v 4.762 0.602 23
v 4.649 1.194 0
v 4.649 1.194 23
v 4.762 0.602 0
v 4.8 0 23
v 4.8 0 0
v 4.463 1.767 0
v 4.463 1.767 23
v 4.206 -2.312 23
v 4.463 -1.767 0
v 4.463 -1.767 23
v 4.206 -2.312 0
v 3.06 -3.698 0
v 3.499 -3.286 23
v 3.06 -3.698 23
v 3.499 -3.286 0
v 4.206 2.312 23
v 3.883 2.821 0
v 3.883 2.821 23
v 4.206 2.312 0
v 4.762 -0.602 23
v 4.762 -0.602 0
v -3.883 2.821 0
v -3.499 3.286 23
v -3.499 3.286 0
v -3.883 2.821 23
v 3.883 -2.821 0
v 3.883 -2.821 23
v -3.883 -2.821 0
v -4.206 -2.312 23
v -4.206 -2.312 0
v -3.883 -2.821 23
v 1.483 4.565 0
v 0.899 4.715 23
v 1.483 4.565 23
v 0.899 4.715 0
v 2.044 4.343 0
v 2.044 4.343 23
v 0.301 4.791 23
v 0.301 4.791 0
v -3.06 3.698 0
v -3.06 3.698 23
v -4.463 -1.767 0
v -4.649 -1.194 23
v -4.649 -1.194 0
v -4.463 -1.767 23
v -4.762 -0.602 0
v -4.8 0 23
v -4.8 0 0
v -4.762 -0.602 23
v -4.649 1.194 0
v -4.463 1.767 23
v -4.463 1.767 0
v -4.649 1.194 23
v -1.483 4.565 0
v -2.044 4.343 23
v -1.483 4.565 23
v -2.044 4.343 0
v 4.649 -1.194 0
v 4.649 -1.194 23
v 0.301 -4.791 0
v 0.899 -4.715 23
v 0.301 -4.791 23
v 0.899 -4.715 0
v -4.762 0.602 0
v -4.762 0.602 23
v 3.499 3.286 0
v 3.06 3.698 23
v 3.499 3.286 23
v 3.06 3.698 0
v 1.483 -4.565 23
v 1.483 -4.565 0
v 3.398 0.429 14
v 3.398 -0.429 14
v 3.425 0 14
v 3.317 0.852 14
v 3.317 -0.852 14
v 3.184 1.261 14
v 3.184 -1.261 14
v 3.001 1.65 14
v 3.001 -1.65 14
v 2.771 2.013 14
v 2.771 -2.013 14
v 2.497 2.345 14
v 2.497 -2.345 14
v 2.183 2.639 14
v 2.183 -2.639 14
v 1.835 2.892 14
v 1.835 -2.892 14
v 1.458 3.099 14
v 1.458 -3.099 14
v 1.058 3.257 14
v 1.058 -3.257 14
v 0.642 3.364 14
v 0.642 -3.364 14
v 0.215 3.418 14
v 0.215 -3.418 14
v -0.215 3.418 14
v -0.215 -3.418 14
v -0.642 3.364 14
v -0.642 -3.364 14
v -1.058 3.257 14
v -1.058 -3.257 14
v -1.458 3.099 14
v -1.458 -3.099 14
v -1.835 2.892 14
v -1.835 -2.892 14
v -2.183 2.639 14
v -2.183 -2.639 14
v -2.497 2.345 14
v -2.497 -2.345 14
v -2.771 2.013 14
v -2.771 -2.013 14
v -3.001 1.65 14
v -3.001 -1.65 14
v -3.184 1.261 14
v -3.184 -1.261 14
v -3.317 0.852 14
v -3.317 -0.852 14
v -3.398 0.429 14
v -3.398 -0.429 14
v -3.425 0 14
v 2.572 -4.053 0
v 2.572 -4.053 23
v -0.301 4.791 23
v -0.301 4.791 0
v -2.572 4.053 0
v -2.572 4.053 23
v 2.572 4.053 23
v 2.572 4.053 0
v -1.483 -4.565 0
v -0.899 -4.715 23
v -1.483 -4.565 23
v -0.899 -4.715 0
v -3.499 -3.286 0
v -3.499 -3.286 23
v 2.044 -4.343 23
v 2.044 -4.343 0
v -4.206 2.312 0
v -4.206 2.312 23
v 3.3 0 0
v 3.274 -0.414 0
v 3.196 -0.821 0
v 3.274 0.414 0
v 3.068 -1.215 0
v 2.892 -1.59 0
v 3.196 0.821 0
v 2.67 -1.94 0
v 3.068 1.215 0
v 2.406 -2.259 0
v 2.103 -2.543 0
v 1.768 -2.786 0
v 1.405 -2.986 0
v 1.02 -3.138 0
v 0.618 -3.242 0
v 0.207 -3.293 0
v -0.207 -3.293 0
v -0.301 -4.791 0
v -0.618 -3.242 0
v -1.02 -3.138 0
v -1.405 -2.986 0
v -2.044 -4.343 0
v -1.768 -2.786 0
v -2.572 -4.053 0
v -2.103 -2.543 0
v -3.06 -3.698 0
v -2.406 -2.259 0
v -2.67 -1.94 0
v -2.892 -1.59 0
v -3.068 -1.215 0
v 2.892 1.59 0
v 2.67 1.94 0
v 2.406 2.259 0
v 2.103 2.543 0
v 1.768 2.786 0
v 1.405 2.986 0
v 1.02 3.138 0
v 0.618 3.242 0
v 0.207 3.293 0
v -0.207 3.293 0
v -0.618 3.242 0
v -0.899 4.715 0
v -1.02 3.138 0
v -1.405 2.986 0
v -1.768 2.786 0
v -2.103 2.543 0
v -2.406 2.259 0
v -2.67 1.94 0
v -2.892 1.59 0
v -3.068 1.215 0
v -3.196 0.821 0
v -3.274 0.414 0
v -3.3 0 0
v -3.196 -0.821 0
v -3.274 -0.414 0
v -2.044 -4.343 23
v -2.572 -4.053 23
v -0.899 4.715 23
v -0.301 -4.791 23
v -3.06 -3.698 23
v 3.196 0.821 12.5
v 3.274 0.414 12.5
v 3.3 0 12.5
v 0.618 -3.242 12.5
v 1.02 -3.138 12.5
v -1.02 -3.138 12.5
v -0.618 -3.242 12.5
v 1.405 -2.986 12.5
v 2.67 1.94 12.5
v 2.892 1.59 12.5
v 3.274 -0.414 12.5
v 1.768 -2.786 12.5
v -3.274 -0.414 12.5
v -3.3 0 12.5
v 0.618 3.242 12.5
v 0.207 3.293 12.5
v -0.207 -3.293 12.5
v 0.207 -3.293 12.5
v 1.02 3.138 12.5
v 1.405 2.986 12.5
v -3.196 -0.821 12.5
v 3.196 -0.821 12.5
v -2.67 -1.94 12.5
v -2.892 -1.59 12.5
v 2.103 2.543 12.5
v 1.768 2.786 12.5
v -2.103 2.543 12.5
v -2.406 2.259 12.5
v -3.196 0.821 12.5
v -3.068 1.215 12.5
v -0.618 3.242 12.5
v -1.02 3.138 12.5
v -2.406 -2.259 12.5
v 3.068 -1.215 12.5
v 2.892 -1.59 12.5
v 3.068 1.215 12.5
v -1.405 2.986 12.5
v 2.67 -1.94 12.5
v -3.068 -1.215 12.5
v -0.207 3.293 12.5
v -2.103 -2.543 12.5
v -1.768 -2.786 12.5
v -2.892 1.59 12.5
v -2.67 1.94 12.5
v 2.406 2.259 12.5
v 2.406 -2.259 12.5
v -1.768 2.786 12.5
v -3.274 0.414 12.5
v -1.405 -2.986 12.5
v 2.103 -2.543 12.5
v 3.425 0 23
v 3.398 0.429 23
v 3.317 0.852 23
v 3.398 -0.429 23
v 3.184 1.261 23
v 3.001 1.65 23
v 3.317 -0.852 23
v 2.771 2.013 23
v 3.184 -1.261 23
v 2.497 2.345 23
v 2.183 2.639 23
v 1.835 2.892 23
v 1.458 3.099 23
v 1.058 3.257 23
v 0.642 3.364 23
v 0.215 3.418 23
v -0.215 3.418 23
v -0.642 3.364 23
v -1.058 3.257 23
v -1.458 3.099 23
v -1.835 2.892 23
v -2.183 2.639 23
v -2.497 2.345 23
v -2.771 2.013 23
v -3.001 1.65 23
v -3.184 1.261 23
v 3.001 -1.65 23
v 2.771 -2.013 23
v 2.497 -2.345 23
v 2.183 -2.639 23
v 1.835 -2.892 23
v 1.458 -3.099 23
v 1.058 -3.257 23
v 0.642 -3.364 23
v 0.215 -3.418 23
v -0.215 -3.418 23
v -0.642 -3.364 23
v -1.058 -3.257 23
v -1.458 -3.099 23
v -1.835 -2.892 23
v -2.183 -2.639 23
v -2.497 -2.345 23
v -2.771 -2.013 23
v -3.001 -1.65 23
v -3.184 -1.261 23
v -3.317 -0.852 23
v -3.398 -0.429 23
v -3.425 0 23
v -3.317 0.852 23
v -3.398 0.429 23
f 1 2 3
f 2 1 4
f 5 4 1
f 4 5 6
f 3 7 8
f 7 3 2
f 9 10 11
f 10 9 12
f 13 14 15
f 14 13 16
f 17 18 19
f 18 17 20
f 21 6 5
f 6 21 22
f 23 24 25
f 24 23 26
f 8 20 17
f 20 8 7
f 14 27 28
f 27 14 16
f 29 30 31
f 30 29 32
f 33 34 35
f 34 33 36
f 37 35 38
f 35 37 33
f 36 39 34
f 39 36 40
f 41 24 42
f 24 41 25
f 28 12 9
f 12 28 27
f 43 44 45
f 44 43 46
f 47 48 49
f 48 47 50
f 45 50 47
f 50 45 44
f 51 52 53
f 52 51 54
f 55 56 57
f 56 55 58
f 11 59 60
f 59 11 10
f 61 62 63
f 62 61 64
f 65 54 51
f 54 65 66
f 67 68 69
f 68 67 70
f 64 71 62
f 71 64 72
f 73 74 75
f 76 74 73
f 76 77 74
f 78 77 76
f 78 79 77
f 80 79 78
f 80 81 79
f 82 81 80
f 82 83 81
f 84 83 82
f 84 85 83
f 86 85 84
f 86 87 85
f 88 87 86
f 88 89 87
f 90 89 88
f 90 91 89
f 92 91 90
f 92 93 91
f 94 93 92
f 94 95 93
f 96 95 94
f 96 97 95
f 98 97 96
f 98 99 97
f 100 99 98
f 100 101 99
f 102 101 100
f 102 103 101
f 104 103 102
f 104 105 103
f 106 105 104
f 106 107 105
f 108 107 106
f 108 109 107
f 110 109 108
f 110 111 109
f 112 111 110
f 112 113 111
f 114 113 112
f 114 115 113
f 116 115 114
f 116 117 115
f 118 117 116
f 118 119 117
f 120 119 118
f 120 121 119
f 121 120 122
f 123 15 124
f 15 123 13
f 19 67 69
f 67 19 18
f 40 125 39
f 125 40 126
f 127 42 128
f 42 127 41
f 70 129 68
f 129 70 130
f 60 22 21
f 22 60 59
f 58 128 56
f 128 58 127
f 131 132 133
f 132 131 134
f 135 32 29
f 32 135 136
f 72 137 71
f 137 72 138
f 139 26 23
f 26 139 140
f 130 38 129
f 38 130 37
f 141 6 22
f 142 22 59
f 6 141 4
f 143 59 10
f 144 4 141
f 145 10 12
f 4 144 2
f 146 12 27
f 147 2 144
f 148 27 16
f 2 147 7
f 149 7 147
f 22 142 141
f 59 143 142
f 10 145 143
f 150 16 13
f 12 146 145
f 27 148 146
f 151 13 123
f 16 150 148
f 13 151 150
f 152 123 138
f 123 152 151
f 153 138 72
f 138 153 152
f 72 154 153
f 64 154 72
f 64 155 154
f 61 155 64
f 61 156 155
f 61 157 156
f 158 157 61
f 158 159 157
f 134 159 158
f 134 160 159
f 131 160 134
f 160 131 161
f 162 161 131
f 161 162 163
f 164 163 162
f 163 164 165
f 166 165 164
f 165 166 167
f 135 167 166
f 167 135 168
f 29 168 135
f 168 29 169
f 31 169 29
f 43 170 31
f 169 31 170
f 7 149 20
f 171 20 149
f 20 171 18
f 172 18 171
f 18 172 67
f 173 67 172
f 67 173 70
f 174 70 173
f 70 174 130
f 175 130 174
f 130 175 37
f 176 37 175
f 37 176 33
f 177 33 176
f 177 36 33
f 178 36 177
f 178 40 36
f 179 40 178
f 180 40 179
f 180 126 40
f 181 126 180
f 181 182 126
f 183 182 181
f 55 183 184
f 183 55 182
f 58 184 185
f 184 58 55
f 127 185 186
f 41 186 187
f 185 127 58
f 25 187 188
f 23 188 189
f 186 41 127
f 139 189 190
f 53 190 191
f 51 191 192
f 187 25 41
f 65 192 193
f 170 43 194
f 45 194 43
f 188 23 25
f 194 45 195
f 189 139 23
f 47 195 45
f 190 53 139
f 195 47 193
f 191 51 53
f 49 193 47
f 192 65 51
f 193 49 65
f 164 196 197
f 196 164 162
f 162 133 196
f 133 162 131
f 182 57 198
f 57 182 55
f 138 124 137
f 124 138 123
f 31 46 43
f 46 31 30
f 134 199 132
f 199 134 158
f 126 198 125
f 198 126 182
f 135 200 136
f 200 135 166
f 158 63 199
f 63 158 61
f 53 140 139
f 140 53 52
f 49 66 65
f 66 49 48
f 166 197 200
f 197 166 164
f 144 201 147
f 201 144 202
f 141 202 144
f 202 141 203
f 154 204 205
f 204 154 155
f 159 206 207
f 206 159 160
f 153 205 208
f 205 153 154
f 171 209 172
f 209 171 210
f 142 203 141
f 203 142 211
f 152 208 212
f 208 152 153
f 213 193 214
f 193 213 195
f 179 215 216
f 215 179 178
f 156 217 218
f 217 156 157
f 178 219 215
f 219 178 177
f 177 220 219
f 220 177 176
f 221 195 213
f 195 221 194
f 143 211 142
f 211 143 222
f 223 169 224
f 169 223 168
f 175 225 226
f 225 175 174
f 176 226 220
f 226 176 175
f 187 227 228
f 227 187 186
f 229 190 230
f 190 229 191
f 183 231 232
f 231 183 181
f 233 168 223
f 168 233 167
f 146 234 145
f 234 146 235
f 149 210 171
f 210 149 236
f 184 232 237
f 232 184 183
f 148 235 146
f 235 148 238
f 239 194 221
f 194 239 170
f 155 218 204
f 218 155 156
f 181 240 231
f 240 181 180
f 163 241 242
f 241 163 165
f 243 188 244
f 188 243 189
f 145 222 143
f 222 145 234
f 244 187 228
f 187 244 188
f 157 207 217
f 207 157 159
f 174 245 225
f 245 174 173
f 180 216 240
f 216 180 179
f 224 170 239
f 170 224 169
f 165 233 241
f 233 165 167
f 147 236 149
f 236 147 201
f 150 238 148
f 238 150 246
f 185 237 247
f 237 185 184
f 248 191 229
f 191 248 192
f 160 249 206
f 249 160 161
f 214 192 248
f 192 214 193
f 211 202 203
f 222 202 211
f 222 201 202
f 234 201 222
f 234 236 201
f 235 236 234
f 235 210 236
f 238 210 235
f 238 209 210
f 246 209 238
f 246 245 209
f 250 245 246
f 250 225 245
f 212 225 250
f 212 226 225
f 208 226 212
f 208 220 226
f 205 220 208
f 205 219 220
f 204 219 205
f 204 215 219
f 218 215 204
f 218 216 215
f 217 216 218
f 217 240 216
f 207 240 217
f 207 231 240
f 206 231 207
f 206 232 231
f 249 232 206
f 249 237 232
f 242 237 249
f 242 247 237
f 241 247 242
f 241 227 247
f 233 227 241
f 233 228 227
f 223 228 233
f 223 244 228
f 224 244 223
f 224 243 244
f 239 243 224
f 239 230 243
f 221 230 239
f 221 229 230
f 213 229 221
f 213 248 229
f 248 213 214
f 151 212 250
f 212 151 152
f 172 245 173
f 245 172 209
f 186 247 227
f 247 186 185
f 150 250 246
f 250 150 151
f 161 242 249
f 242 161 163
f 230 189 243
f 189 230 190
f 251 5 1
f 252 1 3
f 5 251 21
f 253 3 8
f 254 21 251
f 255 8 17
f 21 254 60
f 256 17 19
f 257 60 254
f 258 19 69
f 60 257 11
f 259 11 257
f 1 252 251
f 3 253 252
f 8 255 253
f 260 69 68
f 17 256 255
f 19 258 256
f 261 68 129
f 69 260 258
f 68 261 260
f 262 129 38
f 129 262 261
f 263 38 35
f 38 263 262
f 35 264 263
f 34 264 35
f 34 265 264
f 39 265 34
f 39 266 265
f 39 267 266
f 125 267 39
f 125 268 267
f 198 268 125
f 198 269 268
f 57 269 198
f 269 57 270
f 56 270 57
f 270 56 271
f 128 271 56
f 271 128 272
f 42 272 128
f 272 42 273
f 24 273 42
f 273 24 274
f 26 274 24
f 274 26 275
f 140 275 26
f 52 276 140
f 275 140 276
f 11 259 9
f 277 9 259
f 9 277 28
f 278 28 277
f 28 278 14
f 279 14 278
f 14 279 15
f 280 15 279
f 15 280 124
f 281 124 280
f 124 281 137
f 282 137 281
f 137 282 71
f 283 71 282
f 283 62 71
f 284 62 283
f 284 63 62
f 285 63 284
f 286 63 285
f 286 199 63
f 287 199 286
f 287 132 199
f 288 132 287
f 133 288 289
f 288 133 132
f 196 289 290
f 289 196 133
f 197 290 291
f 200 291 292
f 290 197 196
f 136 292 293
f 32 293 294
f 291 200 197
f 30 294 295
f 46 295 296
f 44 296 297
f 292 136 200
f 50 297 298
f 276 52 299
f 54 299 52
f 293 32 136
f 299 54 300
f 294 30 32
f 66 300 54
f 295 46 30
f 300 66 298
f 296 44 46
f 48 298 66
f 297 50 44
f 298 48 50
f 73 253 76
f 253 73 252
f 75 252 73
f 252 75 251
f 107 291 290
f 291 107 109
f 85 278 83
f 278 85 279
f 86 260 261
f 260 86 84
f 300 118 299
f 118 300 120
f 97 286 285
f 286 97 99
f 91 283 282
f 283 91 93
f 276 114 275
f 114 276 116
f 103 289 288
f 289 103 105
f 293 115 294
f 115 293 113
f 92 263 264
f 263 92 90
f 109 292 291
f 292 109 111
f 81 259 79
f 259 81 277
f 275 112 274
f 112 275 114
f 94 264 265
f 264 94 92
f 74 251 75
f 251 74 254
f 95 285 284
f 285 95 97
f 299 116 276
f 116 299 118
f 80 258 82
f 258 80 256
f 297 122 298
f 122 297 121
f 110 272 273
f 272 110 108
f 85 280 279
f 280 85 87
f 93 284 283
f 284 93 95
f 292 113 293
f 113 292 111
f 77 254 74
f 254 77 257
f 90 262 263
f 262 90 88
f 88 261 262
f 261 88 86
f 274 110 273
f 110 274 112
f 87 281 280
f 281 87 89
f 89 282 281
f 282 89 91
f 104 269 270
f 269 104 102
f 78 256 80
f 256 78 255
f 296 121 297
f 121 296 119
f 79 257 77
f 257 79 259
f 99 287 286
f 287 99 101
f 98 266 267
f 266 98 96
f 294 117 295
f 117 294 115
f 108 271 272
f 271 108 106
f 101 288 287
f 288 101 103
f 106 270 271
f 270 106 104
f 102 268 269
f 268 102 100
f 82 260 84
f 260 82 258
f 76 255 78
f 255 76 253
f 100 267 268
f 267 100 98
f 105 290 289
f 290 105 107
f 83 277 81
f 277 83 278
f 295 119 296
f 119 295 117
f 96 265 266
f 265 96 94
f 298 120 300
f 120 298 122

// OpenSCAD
/* 
   Parametric ROD CONNECTOR - Ball joint to carbon fiber rod
   v1.0
*/

/*********************************************************************/
/*********************************************************************
Copyright (C) 2016  Alejandro Véliz Fernández

This program is free software: you can redistribute it and/or modify
it under the terms of the GNU General Public License as published by
the Free Software Foundation, either version 3 of the License, or
(at your option) any later version.

This program is distributed in the hope that it will be useful,
but WITHOUT ANY WARRANTY; without even the implied warranty of
MERCHANTABILITY or FITNESS FOR A PARTICULAR PURPOSE.  See the
GNU General Public License for more details.

You should have received a copy of the GNU General Public License
along with this program.  If not, see <http://www.gnu.org/licenses/>.
*********************************************************************/
/********************************************************************/

/* Configuration params */
// Rod diameter
Rodiam = 6.2;
// Rod length (rod length that goes into the part)
Rodlen = 12.5;
// End Rod diameter
EndRodiam = 6.45;
// End Rod length (end rod length that goes into the part)
EndRodlen = 9;
// Print tolerance
tolerance = 0.4;
// Wall thickness
walls = 3;
// Solid separator length
solidlen = 1.5;
/* [Hidden] */
$fn=50;


/* Connector code */
union(){
    // Rod part
    difference(){
        cylinder(r=(Rodiam+tolerance+walls)/2, h=Rodlen+solidlen);
        translate([0,0,-2])cylinder(r=(Rodiam+tolerance)/2, h=Rodlen+2);
    }
    // End Rod
    translate([0,0,Rodlen+solidlen]){
        difference(){
            cylinder(r=(Rodiam+tolerance+walls)/2, h=EndRodlen);
            cylinder(r=(EndRodiam+tolerance)/2, h=EndRodlen+2);
        }
    }
}
